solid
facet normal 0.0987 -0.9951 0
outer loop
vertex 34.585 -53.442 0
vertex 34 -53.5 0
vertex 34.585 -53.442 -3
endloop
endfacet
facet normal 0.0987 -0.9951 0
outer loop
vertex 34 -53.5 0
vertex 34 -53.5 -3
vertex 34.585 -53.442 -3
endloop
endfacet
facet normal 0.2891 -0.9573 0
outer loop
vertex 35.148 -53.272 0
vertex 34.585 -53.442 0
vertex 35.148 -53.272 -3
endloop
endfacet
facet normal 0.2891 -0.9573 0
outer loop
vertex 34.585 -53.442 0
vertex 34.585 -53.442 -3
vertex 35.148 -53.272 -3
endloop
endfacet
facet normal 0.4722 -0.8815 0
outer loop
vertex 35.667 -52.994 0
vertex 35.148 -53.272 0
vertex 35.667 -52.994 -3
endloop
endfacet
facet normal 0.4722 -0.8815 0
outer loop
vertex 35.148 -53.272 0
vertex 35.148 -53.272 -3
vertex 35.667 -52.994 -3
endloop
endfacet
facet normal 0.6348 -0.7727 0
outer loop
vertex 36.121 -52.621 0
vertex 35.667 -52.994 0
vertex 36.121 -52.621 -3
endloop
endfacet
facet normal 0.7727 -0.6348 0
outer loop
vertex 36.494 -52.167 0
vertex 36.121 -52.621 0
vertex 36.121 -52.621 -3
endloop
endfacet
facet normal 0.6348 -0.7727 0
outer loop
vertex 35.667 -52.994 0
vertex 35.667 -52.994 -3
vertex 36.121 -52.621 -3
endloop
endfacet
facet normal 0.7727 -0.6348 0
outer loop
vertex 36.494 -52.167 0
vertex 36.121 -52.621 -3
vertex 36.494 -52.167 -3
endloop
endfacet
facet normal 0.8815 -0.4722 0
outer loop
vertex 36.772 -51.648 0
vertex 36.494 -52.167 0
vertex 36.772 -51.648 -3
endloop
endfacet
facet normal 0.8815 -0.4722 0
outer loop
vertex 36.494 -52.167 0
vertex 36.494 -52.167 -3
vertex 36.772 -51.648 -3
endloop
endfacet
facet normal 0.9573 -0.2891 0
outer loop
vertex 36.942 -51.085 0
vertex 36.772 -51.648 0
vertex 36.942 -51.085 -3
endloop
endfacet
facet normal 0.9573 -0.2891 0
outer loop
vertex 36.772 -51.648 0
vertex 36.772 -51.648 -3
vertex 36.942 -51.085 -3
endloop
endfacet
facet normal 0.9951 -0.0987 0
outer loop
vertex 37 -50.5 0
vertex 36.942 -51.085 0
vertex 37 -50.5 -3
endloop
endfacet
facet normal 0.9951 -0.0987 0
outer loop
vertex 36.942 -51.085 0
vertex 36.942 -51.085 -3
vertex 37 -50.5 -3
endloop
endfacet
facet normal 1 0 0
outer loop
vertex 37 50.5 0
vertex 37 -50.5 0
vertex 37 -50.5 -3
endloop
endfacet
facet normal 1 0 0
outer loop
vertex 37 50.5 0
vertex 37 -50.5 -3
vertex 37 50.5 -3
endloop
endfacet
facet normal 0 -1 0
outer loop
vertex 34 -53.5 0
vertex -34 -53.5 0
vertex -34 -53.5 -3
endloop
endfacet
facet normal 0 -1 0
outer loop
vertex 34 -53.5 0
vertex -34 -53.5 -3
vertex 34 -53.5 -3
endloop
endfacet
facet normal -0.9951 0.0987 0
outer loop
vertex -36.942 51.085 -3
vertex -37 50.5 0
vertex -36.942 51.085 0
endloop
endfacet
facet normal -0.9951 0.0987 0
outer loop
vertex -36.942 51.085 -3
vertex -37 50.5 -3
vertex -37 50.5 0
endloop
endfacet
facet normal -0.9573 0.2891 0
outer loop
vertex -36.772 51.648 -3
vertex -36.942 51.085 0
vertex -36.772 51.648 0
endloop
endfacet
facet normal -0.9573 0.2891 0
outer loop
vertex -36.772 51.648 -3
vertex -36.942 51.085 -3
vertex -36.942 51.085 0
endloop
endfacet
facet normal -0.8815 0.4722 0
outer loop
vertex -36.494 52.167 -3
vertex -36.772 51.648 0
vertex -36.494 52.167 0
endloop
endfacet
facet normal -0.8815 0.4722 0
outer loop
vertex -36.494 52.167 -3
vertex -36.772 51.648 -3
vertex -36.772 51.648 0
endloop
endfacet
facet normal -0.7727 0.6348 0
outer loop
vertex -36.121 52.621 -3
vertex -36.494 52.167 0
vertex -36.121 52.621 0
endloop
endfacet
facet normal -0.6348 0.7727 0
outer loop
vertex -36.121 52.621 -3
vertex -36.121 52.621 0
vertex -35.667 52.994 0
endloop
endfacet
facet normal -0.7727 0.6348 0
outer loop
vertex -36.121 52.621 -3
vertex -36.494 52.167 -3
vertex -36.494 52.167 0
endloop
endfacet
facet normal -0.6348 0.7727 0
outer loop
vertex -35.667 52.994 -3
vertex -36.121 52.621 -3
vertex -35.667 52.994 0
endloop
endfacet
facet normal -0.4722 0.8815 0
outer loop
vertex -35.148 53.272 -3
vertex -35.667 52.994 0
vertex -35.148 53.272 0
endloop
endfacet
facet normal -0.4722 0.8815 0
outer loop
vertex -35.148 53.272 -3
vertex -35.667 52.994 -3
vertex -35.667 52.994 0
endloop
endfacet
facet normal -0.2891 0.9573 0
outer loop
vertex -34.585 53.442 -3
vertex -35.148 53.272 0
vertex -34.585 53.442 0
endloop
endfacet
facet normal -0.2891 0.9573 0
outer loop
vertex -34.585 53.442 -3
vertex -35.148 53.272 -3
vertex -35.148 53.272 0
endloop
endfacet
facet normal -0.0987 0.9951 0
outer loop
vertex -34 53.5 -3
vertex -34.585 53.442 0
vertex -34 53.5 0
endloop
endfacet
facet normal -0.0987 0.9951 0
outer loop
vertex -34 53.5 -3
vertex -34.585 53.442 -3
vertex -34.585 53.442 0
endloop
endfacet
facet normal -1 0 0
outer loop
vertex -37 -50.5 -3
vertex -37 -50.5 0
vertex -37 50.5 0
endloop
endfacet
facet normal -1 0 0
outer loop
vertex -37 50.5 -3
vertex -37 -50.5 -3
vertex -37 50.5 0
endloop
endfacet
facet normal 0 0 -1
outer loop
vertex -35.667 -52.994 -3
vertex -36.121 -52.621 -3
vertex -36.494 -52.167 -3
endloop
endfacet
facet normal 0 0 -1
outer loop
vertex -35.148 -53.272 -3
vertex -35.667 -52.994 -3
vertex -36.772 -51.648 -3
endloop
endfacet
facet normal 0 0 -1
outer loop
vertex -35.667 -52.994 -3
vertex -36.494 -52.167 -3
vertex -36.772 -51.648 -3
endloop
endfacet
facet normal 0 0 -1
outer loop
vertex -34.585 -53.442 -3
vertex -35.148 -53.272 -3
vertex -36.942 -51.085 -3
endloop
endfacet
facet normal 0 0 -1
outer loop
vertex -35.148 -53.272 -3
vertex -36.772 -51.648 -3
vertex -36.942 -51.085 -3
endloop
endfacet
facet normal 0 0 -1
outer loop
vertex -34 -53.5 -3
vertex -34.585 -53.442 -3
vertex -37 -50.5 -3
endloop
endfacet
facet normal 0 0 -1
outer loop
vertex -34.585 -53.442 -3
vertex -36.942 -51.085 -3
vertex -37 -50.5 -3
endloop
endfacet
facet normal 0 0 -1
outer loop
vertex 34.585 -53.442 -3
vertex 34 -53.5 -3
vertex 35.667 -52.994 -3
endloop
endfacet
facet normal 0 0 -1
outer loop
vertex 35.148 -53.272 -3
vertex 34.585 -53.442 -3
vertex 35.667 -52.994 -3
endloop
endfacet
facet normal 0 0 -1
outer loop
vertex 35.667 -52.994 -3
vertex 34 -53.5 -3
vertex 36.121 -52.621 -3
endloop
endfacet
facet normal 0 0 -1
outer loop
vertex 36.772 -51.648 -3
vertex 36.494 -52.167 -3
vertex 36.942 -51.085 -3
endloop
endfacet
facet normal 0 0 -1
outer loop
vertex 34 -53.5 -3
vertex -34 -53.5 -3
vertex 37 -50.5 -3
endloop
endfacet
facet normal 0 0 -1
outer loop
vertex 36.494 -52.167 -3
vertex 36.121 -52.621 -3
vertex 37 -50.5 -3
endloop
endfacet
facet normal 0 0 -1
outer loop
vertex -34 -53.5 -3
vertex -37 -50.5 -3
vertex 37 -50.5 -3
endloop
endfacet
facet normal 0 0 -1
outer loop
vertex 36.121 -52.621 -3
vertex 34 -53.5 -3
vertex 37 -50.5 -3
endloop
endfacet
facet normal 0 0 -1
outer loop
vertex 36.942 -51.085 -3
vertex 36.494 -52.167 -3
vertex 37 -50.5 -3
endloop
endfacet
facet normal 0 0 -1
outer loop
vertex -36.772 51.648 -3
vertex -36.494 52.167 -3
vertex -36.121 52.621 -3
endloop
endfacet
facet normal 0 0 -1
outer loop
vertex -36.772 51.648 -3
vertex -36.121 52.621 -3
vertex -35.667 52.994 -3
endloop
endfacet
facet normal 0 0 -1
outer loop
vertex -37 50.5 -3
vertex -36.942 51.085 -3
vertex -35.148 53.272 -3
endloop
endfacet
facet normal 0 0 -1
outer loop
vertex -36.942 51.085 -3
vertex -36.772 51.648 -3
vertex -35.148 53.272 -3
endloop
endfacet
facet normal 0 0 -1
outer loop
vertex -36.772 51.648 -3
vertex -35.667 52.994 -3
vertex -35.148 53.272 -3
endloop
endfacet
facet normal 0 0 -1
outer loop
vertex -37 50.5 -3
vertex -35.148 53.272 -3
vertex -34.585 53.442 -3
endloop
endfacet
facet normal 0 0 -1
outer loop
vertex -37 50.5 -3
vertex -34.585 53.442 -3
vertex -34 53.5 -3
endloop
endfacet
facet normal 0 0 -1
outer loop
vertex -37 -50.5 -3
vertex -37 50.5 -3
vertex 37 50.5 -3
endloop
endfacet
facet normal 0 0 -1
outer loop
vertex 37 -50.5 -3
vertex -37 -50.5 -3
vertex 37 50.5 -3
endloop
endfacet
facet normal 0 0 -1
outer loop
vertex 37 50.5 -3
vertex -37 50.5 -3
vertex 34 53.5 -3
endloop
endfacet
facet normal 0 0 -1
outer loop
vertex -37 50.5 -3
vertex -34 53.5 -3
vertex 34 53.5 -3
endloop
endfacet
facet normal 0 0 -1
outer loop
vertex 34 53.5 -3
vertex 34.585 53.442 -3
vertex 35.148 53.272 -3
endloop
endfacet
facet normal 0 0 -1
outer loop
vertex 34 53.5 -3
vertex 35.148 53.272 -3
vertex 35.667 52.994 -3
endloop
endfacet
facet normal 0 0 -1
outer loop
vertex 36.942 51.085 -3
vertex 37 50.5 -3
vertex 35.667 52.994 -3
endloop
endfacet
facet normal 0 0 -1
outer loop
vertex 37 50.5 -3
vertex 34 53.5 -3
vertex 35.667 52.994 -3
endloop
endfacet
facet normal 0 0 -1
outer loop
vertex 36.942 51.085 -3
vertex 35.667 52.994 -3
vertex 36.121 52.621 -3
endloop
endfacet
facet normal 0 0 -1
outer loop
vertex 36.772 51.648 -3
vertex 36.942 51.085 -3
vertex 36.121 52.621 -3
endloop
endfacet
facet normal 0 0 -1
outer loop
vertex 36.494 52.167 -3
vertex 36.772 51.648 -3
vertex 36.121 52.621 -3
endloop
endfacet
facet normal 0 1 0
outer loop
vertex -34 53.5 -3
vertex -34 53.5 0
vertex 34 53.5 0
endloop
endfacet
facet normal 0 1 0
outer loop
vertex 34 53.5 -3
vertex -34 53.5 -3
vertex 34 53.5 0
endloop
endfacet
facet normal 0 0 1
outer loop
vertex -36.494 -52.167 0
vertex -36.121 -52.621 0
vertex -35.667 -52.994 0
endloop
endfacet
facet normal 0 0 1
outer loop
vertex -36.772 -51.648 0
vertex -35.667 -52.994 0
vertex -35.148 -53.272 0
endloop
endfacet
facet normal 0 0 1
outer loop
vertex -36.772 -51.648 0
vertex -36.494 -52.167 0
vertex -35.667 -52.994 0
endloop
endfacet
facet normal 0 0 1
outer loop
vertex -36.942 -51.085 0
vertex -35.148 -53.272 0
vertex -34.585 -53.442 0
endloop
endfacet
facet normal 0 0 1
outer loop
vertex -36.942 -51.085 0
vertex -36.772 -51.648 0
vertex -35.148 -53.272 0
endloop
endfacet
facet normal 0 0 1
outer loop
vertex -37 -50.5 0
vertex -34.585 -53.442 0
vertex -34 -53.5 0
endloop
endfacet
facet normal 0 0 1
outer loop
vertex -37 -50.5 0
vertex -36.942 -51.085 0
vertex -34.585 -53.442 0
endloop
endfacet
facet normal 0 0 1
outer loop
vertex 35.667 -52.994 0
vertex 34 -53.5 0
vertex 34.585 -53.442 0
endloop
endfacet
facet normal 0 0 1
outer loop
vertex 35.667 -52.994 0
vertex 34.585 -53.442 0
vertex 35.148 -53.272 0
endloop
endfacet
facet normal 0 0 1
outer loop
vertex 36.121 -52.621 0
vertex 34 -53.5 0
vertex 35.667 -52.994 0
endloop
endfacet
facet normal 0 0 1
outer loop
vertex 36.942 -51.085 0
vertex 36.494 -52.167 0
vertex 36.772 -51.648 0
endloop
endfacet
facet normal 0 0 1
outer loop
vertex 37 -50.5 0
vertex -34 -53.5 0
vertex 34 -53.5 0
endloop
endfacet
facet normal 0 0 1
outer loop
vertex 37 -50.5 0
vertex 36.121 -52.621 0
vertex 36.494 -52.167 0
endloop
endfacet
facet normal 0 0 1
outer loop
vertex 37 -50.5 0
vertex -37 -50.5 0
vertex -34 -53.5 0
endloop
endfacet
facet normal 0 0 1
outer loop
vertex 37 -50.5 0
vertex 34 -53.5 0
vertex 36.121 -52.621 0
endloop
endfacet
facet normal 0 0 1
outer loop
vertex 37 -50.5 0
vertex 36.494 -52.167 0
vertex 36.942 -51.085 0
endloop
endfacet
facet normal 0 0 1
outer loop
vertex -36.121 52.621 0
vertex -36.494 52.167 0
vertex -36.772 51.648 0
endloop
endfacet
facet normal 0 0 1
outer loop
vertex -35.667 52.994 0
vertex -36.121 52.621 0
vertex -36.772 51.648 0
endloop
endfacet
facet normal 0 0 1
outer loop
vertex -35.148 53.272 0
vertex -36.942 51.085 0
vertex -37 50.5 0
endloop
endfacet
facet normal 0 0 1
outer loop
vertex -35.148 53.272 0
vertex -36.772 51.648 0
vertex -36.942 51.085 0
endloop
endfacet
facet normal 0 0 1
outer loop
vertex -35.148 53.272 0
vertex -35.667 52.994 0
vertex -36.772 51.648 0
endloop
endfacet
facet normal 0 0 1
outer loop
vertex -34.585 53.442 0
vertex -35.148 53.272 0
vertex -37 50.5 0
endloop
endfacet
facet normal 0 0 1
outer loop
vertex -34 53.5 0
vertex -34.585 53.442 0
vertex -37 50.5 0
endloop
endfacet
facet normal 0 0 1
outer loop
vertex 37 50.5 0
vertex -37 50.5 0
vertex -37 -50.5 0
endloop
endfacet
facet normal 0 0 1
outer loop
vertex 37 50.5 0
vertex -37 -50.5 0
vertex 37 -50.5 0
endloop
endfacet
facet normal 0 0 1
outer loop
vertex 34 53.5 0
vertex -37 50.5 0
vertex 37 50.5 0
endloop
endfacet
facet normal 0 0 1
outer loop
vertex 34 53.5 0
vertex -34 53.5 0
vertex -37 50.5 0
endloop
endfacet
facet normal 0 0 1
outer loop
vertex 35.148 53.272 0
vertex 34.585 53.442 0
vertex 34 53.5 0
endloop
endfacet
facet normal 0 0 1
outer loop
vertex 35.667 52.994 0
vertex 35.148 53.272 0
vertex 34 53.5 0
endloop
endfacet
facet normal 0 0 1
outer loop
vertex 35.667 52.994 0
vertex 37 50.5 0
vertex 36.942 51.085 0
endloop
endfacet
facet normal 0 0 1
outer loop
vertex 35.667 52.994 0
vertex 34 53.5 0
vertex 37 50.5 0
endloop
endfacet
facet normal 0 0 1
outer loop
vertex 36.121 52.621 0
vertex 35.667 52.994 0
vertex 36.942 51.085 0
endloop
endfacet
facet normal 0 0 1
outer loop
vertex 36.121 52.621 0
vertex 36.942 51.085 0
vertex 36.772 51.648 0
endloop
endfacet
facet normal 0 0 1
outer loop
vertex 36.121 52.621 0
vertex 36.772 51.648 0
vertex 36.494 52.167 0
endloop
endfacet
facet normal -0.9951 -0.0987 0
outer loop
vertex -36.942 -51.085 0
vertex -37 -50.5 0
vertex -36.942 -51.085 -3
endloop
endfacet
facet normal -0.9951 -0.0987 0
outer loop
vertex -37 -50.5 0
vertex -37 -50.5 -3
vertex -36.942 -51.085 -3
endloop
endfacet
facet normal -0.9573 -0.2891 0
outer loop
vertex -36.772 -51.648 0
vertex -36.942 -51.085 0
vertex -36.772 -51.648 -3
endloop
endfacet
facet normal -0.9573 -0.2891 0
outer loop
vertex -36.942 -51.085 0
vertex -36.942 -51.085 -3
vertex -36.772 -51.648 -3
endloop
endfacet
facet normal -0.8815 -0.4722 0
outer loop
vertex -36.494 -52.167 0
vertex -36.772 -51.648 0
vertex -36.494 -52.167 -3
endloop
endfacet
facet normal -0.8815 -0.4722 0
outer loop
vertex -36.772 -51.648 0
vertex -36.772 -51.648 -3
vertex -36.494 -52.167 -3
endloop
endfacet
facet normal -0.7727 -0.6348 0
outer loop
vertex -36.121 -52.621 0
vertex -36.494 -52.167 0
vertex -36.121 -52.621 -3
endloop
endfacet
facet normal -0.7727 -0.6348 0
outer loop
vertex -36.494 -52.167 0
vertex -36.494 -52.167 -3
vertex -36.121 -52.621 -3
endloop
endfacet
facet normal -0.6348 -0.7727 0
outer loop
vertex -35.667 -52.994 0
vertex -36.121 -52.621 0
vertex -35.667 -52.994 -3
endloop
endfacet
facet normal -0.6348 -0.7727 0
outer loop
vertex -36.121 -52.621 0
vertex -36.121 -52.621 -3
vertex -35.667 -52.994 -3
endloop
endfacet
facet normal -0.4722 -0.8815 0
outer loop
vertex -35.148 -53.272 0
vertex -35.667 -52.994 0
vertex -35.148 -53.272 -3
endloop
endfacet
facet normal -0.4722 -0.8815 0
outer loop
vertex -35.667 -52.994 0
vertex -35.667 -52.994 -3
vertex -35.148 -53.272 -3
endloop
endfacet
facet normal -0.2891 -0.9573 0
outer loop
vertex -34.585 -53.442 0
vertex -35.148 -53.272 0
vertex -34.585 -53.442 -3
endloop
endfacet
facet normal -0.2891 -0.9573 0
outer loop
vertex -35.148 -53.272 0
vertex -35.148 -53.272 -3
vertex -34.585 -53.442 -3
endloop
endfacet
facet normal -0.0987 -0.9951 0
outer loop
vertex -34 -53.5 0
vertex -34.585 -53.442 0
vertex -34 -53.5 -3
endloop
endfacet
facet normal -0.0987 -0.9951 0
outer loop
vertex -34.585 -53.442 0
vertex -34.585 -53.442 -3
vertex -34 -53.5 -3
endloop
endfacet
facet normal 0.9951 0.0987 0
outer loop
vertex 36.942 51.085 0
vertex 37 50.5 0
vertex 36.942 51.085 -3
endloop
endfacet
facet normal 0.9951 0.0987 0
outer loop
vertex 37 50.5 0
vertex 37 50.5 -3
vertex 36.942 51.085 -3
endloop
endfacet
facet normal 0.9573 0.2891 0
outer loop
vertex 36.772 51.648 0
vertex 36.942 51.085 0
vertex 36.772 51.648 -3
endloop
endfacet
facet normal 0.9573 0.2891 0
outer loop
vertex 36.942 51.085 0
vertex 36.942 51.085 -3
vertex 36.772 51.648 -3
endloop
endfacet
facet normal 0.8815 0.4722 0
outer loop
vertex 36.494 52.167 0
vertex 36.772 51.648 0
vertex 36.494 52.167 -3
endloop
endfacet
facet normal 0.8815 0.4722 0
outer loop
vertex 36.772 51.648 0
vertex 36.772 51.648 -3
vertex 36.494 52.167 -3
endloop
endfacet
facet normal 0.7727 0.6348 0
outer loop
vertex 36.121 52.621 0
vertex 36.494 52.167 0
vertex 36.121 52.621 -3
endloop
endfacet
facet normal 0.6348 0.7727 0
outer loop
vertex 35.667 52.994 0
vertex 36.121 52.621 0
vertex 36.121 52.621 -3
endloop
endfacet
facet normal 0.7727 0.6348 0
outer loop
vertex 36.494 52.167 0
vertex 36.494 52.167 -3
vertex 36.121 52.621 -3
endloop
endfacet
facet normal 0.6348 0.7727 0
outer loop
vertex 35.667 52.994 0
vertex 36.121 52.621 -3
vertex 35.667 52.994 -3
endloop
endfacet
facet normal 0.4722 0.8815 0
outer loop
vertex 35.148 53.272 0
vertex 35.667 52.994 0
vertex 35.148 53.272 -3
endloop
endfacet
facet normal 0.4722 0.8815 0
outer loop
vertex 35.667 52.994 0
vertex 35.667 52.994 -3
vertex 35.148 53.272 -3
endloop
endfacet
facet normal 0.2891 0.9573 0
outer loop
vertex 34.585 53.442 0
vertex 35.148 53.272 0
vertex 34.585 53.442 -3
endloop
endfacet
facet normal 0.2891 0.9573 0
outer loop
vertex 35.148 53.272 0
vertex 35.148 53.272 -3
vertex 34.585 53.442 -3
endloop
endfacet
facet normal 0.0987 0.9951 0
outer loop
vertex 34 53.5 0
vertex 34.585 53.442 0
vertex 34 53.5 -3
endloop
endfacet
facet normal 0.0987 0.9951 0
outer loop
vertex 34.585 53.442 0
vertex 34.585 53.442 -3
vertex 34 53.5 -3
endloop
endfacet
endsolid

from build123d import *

# Parameters (mm, degrees)
IZIM1_W            = 74
IZIM1_H            = 107
TABAN_FLAN_1_DEPTH = 3
RADYUS1_R          = 3


# Sheet-metal steps are written as plain solids
with BuildPart() as part:
    # Çizim1 → Taban-Flanş1 (new body)
    with BuildSketch(Plane.XY):
        Rectangle(IZIM1_W, IZIM1_H)
    extrude(amount=-TABAN_FLAN_1_DEPTH)

    # Radyus1
    radyus1_edges = [part.edges().sort_by_distance(p)[0] for p in [
        (37, -53.5, -1.5),
        (-37, -53.5, -1.5),
        (-37, 53.5, -1.5),
        (37, 53.5, -1.5),
    ]]
    fillet(radyus1_edges, radius=RADYUS1_R)


solid = part.part
